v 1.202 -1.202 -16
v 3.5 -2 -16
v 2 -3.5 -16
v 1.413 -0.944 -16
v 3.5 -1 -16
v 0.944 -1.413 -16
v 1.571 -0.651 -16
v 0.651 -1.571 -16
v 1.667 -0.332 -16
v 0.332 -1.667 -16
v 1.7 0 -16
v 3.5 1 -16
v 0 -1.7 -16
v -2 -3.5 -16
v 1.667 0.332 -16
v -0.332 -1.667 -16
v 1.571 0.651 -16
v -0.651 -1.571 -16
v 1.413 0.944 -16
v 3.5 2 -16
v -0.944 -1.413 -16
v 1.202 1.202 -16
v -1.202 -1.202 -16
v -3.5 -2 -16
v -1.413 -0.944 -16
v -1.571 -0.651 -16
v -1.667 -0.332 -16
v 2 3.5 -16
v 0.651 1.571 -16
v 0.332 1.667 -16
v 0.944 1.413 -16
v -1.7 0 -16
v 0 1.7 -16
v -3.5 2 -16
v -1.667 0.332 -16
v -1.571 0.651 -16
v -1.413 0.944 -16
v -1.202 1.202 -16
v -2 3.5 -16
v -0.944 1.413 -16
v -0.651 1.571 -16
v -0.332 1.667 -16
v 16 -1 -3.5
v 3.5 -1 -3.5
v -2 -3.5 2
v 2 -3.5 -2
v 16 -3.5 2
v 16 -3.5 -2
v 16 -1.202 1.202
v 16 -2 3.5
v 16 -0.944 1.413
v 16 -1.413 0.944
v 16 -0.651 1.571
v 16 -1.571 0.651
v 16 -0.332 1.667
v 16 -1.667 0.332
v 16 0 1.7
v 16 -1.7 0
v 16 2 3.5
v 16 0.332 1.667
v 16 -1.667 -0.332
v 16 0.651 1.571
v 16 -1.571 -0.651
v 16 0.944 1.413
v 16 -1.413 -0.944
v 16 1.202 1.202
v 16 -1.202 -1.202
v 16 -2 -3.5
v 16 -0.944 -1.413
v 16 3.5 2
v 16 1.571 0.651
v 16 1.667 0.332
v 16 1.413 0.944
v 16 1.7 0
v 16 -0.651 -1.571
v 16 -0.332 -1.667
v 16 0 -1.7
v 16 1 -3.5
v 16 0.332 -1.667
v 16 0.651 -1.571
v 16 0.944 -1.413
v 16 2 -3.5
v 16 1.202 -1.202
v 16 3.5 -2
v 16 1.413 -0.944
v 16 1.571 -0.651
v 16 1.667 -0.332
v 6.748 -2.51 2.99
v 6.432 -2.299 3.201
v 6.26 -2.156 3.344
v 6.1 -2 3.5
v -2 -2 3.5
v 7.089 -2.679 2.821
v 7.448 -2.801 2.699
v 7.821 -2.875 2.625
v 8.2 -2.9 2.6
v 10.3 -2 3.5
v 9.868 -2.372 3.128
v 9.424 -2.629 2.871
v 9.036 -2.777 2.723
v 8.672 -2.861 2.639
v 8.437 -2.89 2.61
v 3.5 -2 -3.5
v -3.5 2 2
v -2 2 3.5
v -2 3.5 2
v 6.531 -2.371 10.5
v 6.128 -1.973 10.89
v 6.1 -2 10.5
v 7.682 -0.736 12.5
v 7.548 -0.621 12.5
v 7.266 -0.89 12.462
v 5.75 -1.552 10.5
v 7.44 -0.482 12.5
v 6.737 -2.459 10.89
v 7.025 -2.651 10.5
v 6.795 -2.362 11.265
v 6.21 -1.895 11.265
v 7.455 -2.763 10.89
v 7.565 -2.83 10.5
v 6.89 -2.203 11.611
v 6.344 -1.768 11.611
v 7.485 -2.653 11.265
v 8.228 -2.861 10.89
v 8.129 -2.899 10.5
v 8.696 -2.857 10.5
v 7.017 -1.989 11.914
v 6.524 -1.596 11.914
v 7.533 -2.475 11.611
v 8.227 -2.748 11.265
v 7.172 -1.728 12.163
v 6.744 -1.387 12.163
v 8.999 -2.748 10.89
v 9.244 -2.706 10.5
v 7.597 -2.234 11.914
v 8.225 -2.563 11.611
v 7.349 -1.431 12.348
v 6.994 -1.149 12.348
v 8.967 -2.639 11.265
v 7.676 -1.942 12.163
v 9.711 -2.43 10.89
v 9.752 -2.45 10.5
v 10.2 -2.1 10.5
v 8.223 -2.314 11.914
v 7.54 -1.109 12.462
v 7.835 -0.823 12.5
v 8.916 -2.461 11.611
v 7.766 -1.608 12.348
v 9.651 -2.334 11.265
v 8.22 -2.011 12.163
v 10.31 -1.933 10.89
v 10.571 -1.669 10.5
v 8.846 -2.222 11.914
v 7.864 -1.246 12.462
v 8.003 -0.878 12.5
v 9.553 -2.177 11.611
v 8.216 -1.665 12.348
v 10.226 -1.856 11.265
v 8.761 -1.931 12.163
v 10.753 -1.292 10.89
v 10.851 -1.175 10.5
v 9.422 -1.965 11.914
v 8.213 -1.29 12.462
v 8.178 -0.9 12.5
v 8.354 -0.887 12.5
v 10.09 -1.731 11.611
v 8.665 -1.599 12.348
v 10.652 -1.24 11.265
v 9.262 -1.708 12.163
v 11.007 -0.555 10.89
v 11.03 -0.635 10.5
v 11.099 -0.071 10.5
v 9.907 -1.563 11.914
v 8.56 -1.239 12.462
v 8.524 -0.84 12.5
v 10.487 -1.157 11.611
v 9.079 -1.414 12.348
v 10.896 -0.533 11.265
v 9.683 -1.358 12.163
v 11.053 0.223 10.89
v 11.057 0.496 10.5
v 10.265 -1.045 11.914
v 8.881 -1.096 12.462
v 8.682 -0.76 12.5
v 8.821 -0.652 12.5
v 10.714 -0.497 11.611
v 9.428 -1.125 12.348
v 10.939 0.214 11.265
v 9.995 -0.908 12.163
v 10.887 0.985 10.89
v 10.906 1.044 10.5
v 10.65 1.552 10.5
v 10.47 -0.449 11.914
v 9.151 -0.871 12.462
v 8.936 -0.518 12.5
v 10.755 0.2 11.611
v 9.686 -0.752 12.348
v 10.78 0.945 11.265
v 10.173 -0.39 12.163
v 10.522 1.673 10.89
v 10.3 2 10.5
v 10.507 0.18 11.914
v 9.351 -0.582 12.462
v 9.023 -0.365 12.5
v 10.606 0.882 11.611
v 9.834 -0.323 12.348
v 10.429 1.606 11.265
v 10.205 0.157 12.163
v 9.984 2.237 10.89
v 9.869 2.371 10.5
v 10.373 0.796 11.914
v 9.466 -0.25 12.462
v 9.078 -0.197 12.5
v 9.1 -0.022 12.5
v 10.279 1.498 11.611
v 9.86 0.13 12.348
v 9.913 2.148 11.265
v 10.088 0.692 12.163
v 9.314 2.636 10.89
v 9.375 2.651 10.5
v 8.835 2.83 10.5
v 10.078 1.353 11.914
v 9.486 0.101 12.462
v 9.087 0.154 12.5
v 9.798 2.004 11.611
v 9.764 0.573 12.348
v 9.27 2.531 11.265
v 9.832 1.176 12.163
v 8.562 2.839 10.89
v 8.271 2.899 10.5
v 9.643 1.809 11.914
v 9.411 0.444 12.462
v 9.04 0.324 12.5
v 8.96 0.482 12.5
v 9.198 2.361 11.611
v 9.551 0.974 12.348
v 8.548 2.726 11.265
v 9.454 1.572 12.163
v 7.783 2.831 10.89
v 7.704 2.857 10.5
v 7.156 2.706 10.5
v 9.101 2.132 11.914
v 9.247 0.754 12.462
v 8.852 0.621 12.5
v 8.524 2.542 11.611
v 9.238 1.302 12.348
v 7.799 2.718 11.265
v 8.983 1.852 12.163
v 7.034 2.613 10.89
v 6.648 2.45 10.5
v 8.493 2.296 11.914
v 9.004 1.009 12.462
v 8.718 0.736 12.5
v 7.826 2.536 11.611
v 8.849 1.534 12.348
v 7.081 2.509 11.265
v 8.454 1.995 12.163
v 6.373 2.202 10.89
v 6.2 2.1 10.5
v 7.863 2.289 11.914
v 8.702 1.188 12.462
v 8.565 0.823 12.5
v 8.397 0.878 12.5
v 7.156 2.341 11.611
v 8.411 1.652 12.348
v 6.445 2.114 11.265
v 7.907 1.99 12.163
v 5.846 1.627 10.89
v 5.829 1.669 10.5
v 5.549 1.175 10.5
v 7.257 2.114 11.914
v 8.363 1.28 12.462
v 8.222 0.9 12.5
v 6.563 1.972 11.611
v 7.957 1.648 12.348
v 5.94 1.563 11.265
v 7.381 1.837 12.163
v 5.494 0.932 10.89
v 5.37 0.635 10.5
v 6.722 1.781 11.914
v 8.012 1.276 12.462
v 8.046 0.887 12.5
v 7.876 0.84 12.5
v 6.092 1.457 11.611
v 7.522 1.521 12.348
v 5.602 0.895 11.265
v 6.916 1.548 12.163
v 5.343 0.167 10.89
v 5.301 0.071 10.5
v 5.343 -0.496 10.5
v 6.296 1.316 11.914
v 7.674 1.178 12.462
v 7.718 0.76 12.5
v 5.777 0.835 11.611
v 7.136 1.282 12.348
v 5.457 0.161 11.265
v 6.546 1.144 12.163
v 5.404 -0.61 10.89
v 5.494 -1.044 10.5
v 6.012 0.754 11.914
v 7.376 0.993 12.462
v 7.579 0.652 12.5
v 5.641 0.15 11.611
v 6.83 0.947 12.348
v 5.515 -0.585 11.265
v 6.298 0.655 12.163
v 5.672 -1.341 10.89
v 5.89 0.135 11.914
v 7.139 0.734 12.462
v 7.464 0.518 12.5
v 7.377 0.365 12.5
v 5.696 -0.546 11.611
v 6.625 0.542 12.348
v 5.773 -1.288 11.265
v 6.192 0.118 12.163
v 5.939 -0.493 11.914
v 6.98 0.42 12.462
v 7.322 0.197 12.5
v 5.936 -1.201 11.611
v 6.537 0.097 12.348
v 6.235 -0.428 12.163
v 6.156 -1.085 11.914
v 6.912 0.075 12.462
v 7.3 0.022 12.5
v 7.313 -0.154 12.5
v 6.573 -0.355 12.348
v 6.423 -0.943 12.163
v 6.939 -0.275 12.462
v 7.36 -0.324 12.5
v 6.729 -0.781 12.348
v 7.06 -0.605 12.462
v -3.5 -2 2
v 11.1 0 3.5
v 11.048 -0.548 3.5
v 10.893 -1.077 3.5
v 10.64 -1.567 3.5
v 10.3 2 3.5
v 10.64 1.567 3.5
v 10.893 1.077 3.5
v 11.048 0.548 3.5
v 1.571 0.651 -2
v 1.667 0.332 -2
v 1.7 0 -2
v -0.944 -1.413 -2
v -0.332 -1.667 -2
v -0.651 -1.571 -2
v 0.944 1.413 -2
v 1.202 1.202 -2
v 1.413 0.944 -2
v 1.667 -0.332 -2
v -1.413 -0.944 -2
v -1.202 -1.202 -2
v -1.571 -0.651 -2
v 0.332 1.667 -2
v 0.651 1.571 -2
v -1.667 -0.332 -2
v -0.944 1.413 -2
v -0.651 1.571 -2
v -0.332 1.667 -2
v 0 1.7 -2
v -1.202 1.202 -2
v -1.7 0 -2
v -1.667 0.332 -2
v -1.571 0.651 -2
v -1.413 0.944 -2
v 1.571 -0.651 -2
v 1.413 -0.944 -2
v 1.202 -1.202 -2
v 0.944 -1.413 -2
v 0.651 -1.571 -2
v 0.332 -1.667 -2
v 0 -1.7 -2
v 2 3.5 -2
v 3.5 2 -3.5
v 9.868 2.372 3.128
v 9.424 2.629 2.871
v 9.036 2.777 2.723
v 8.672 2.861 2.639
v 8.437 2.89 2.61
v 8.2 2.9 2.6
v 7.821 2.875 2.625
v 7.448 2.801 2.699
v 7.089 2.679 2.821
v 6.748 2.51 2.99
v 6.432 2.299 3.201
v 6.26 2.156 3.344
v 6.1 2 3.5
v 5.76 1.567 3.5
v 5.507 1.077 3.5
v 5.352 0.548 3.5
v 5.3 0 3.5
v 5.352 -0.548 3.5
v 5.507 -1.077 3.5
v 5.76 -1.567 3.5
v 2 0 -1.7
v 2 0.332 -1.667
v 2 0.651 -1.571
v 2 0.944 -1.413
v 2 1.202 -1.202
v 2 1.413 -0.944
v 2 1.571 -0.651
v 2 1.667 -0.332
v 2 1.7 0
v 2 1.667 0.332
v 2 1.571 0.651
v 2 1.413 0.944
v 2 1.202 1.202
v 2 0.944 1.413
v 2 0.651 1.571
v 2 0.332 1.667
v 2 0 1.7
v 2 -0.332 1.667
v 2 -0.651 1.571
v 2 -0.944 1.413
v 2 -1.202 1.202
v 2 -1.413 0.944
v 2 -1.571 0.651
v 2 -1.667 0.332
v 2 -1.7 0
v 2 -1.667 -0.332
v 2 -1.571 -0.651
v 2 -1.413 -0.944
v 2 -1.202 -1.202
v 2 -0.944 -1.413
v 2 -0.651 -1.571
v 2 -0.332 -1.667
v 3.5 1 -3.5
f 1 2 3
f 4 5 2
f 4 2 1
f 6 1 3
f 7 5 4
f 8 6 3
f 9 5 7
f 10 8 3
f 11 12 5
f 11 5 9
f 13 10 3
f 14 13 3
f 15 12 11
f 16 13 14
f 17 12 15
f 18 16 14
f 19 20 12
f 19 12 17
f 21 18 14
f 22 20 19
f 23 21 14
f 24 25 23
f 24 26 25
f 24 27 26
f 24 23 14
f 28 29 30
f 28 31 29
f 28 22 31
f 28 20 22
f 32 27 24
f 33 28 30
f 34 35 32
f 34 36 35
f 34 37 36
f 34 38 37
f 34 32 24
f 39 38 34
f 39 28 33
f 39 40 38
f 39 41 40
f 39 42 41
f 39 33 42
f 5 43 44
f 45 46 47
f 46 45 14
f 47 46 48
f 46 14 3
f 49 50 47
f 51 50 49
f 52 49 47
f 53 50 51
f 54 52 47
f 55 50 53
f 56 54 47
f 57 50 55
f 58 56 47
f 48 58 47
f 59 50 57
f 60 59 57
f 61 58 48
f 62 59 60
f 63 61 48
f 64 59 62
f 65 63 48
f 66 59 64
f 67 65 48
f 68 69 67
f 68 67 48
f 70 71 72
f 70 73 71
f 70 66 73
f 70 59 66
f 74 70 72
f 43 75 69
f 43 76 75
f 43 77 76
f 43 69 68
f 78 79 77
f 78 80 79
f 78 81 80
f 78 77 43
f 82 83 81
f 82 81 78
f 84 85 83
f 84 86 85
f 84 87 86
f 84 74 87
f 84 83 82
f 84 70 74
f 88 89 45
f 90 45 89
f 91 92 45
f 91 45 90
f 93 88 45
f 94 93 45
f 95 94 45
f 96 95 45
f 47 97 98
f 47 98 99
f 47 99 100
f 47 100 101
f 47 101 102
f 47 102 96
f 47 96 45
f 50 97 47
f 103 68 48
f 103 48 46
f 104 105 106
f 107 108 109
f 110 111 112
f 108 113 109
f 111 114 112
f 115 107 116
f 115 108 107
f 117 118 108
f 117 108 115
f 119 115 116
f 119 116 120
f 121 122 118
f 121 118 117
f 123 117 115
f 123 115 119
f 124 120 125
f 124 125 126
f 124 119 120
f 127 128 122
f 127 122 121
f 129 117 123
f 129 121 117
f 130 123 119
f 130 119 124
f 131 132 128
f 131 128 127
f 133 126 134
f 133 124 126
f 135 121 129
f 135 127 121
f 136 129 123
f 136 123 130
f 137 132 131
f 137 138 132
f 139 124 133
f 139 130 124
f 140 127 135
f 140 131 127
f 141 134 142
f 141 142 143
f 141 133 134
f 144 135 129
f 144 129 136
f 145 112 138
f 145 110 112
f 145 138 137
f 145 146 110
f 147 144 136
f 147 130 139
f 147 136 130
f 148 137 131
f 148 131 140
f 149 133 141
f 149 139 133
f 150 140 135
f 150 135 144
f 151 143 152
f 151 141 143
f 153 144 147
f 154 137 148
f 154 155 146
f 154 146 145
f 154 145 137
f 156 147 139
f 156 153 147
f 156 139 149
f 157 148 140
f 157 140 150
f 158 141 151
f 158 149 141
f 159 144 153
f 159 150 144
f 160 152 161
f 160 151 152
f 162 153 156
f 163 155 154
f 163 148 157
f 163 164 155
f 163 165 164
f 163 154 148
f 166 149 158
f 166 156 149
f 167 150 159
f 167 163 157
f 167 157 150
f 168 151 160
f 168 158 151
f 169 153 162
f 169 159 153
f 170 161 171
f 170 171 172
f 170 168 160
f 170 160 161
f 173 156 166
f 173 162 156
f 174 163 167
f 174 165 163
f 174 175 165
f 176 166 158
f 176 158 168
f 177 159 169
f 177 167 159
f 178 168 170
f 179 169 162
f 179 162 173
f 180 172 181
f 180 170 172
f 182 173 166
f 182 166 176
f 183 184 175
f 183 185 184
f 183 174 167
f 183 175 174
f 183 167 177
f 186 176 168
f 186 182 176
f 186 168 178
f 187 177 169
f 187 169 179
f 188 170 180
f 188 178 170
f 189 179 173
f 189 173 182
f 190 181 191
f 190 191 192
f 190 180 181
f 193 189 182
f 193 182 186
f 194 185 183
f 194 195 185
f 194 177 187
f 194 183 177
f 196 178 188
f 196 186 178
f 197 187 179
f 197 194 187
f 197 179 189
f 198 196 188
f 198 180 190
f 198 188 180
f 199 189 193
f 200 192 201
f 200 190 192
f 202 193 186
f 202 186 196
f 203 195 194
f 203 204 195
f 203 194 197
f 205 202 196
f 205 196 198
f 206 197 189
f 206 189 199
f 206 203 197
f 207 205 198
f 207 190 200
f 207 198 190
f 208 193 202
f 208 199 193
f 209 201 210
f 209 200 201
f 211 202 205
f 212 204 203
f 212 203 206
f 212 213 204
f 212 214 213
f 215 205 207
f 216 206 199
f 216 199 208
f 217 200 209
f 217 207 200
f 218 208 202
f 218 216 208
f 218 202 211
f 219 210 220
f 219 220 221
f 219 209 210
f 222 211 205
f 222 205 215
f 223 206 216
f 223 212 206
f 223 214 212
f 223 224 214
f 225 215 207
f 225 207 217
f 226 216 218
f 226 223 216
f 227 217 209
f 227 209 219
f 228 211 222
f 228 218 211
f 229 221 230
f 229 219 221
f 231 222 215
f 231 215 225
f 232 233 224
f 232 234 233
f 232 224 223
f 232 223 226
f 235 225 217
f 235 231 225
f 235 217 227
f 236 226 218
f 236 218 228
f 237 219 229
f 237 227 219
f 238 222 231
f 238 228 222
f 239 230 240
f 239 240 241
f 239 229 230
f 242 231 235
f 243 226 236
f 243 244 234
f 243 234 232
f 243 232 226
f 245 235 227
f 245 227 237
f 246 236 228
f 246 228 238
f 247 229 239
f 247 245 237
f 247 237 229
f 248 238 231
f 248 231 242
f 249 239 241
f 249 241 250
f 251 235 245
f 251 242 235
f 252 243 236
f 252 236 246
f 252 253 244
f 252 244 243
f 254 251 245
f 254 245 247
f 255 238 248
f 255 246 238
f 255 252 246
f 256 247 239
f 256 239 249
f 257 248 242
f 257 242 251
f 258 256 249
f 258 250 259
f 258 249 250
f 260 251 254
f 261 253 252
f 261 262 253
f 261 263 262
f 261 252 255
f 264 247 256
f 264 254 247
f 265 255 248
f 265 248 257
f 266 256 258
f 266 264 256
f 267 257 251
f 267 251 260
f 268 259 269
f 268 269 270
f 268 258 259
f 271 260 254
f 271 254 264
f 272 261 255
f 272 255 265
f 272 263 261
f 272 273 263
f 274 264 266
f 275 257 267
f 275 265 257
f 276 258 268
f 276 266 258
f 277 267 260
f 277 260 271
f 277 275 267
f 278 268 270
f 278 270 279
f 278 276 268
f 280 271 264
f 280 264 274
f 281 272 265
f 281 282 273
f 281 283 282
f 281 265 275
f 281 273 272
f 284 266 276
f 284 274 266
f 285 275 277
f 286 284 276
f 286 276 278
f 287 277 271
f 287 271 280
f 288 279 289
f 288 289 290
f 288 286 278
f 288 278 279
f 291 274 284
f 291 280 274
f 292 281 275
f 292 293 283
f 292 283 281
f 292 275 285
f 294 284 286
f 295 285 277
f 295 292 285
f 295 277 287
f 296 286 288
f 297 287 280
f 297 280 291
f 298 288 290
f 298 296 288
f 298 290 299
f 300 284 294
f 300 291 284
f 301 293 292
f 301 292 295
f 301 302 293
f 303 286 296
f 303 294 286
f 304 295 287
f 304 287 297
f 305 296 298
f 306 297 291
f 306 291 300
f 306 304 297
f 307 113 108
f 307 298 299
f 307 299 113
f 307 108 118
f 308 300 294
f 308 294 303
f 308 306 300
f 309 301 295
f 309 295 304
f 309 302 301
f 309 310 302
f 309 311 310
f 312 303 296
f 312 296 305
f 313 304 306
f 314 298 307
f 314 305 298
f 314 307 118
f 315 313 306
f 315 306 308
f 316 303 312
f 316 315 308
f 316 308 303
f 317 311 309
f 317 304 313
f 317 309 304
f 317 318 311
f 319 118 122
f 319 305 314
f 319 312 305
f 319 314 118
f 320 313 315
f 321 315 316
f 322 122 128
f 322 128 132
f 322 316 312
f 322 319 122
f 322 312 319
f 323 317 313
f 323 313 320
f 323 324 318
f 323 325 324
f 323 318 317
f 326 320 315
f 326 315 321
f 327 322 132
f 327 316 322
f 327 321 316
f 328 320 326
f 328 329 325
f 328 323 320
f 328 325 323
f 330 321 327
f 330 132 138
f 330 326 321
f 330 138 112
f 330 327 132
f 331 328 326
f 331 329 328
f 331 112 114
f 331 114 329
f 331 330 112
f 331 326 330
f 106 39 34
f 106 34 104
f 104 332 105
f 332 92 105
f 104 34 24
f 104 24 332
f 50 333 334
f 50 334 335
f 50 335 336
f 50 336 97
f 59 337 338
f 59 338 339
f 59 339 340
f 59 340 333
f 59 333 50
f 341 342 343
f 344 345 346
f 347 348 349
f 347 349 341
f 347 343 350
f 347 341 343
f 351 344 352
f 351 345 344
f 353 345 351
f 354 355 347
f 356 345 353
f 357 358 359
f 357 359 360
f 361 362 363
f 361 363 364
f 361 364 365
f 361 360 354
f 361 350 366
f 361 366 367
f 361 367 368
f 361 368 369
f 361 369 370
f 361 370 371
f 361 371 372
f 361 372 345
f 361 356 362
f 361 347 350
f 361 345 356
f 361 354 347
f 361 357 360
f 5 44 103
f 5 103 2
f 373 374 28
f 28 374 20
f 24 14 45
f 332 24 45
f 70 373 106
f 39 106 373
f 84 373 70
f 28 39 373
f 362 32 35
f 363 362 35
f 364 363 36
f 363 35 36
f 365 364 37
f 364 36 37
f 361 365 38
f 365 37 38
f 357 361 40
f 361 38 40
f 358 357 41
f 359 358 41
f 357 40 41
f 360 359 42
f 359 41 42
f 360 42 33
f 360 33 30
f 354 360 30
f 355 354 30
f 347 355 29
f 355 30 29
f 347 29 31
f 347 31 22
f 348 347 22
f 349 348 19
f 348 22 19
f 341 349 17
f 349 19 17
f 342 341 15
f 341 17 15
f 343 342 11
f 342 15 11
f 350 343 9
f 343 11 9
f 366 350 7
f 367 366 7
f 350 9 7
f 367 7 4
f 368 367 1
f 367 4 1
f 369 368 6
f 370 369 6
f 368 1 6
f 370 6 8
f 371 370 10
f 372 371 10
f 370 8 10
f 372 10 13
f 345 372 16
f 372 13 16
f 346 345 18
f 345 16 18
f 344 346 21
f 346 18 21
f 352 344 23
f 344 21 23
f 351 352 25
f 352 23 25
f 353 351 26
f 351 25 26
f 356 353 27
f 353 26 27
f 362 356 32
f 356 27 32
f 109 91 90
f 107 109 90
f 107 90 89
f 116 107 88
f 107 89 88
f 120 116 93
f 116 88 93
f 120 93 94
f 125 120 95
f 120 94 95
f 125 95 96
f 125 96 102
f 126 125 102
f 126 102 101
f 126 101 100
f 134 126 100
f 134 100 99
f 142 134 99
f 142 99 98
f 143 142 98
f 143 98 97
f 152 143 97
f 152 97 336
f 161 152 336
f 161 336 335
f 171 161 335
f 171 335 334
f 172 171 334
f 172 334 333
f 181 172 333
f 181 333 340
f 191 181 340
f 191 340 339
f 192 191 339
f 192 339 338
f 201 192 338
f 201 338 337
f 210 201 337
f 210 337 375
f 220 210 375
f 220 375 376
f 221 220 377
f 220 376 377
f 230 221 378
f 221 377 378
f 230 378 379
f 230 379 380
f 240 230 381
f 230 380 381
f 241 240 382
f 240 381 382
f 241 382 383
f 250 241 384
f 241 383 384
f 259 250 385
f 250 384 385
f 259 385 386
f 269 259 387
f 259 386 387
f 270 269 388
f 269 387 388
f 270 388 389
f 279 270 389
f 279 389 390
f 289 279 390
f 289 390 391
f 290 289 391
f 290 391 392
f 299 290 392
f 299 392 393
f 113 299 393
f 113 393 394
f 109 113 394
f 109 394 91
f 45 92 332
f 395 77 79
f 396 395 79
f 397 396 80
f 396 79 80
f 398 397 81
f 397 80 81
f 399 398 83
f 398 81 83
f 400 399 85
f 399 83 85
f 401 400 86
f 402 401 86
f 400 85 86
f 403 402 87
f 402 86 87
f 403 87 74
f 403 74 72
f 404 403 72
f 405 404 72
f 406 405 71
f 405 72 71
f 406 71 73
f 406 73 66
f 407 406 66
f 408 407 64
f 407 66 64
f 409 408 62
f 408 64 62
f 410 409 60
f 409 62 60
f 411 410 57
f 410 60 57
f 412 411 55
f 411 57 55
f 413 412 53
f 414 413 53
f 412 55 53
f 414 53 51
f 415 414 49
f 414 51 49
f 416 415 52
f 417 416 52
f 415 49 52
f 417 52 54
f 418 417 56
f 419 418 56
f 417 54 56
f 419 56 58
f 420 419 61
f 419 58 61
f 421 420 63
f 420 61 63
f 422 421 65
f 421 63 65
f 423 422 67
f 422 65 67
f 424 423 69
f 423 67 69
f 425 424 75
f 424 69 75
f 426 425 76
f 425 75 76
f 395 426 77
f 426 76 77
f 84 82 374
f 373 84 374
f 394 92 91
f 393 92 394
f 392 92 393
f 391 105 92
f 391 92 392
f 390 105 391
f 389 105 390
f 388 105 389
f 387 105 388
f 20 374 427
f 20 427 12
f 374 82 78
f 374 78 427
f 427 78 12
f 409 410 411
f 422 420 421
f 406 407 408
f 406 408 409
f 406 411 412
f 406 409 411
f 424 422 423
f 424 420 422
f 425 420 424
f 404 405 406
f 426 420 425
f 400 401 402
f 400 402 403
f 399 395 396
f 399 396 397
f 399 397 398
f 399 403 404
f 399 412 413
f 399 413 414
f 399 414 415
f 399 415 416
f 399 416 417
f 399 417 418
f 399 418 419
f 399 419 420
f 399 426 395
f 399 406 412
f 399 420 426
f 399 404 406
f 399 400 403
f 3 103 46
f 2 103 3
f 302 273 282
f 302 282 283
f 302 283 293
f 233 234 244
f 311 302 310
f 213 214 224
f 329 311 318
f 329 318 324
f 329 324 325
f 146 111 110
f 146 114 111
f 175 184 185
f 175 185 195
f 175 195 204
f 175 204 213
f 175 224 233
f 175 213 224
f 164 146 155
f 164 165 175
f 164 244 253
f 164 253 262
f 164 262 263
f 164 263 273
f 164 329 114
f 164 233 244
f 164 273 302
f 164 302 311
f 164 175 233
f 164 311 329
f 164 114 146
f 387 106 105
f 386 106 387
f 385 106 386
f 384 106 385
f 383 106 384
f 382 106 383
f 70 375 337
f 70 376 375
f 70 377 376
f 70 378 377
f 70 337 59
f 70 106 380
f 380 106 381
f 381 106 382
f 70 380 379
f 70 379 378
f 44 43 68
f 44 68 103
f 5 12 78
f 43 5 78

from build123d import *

# Parameters (mm, degrees)
BOSS_EXTRUDE1_DEPTH  = 3.5
SKETCH2_R            = 1.7
CUT_EXTRUDE1_DEPTH   = 14
SKETCH3_R            = 1.7
CUT_EXTRUDE2_DEPTH   = 14
BOSS_EXTRUDE2_DEPTH  = 1
CHAMFER1_SIZE        = 1.5
BOSS_EXTRUDE15_START = -0.9
SKETCH20_R           = 2.9
BOSS_EXTRUDE15_DEPTH = 9.9
FILLET1_R            = 2


with BuildPart() as part:
    # Sketch1 → Boss-Extrude1 (new, symmetric)
    with BuildSketch(Plane(origin=(0, 0, 0), x_dir=(1, 0, 0), z_dir=(0, 1, 0))):
        Polygon((-3.5, 16), (-3.5, -3.5), (16, -3.5), (16, 3.5), (3.5, 3.5), (3.5, 16), align=None)
    extrude(amount=BOSS_EXTRUDE1_DEPTH, both=True)

    # Sketch2 → Cut-Extrude1 (cut)
    with BuildSketch(Plane(origin=(0, 0, -16), x_dir=(-1, 0, 0), z_dir=(0, 0, -1))):
        Circle(SKETCH2_R)
    extrude(amount=-CUT_EXTRUDE1_DEPTH, mode=Mode.SUBTRACT)

    # Sketch3 → Cut-Extrude2 (cut)
    with BuildSketch(Plane(origin=(16, 0, 0), x_dir=(0, 0, -1), z_dir=(1, 0, 0))):
        Circle(SKETCH3_R)
    extrude(amount=-CUT_EXTRUDE2_DEPTH, mode=Mode.SUBTRACT)

    # Sketch4 → Boss-Extrude2 (add, symmetric)
    with BuildSketch(Plane(origin=(0, 0, 0), x_dir=(1, 0, 0), z_dir=(0, 1, 0))):
        Polygon((3.5, 16), (16, 3.5), (3.5, 3.5), align=None)
    extrude(amount=BOSS_EXTRUDE2_DEPTH, both=True)

    # Chamfer1
    chamfer1_edges = [part.edges().sort_by_distance(p)[0] for p in [
        (-3.5, 0, 3.5),
        (6.25, 3.5, 3.5),
        (9.75, 3.5, -3.5),
        (3.5, 3.5, -9.75),
        (3.5, -3.5, -9.75),
        (9.75, -3.5, -3.5),
        (6.25, -3.5, 3.5),
        (-3.5, -3.5, -6.25),
        (-3.5, 3.5, -6.25),
    ]]
    chamfer(chamfer1_edges, length=CHAMFER1_SIZE)

    # Sketch20 → Boss-Extrude15 (add)
    with BuildSketch(Plane.XY.offset(3.5).offset(BOSS_EXTRUDE15_START)):
        with Locations(Location((8.2, 0, 0), (0, 0, 223.602818973))):
            Circle(SKETCH20_R)
    extrude(amount=BOSS_EXTRUDE15_DEPTH)

    # Fillet1
    fillet1_edges = [part.edges().sort_by_distance(p)[0] for p in [
        (10.3, 2, 12.5),
    ]]
    fillet(fillet1_edges, radius=FILLET1_R)


solid = part.part
